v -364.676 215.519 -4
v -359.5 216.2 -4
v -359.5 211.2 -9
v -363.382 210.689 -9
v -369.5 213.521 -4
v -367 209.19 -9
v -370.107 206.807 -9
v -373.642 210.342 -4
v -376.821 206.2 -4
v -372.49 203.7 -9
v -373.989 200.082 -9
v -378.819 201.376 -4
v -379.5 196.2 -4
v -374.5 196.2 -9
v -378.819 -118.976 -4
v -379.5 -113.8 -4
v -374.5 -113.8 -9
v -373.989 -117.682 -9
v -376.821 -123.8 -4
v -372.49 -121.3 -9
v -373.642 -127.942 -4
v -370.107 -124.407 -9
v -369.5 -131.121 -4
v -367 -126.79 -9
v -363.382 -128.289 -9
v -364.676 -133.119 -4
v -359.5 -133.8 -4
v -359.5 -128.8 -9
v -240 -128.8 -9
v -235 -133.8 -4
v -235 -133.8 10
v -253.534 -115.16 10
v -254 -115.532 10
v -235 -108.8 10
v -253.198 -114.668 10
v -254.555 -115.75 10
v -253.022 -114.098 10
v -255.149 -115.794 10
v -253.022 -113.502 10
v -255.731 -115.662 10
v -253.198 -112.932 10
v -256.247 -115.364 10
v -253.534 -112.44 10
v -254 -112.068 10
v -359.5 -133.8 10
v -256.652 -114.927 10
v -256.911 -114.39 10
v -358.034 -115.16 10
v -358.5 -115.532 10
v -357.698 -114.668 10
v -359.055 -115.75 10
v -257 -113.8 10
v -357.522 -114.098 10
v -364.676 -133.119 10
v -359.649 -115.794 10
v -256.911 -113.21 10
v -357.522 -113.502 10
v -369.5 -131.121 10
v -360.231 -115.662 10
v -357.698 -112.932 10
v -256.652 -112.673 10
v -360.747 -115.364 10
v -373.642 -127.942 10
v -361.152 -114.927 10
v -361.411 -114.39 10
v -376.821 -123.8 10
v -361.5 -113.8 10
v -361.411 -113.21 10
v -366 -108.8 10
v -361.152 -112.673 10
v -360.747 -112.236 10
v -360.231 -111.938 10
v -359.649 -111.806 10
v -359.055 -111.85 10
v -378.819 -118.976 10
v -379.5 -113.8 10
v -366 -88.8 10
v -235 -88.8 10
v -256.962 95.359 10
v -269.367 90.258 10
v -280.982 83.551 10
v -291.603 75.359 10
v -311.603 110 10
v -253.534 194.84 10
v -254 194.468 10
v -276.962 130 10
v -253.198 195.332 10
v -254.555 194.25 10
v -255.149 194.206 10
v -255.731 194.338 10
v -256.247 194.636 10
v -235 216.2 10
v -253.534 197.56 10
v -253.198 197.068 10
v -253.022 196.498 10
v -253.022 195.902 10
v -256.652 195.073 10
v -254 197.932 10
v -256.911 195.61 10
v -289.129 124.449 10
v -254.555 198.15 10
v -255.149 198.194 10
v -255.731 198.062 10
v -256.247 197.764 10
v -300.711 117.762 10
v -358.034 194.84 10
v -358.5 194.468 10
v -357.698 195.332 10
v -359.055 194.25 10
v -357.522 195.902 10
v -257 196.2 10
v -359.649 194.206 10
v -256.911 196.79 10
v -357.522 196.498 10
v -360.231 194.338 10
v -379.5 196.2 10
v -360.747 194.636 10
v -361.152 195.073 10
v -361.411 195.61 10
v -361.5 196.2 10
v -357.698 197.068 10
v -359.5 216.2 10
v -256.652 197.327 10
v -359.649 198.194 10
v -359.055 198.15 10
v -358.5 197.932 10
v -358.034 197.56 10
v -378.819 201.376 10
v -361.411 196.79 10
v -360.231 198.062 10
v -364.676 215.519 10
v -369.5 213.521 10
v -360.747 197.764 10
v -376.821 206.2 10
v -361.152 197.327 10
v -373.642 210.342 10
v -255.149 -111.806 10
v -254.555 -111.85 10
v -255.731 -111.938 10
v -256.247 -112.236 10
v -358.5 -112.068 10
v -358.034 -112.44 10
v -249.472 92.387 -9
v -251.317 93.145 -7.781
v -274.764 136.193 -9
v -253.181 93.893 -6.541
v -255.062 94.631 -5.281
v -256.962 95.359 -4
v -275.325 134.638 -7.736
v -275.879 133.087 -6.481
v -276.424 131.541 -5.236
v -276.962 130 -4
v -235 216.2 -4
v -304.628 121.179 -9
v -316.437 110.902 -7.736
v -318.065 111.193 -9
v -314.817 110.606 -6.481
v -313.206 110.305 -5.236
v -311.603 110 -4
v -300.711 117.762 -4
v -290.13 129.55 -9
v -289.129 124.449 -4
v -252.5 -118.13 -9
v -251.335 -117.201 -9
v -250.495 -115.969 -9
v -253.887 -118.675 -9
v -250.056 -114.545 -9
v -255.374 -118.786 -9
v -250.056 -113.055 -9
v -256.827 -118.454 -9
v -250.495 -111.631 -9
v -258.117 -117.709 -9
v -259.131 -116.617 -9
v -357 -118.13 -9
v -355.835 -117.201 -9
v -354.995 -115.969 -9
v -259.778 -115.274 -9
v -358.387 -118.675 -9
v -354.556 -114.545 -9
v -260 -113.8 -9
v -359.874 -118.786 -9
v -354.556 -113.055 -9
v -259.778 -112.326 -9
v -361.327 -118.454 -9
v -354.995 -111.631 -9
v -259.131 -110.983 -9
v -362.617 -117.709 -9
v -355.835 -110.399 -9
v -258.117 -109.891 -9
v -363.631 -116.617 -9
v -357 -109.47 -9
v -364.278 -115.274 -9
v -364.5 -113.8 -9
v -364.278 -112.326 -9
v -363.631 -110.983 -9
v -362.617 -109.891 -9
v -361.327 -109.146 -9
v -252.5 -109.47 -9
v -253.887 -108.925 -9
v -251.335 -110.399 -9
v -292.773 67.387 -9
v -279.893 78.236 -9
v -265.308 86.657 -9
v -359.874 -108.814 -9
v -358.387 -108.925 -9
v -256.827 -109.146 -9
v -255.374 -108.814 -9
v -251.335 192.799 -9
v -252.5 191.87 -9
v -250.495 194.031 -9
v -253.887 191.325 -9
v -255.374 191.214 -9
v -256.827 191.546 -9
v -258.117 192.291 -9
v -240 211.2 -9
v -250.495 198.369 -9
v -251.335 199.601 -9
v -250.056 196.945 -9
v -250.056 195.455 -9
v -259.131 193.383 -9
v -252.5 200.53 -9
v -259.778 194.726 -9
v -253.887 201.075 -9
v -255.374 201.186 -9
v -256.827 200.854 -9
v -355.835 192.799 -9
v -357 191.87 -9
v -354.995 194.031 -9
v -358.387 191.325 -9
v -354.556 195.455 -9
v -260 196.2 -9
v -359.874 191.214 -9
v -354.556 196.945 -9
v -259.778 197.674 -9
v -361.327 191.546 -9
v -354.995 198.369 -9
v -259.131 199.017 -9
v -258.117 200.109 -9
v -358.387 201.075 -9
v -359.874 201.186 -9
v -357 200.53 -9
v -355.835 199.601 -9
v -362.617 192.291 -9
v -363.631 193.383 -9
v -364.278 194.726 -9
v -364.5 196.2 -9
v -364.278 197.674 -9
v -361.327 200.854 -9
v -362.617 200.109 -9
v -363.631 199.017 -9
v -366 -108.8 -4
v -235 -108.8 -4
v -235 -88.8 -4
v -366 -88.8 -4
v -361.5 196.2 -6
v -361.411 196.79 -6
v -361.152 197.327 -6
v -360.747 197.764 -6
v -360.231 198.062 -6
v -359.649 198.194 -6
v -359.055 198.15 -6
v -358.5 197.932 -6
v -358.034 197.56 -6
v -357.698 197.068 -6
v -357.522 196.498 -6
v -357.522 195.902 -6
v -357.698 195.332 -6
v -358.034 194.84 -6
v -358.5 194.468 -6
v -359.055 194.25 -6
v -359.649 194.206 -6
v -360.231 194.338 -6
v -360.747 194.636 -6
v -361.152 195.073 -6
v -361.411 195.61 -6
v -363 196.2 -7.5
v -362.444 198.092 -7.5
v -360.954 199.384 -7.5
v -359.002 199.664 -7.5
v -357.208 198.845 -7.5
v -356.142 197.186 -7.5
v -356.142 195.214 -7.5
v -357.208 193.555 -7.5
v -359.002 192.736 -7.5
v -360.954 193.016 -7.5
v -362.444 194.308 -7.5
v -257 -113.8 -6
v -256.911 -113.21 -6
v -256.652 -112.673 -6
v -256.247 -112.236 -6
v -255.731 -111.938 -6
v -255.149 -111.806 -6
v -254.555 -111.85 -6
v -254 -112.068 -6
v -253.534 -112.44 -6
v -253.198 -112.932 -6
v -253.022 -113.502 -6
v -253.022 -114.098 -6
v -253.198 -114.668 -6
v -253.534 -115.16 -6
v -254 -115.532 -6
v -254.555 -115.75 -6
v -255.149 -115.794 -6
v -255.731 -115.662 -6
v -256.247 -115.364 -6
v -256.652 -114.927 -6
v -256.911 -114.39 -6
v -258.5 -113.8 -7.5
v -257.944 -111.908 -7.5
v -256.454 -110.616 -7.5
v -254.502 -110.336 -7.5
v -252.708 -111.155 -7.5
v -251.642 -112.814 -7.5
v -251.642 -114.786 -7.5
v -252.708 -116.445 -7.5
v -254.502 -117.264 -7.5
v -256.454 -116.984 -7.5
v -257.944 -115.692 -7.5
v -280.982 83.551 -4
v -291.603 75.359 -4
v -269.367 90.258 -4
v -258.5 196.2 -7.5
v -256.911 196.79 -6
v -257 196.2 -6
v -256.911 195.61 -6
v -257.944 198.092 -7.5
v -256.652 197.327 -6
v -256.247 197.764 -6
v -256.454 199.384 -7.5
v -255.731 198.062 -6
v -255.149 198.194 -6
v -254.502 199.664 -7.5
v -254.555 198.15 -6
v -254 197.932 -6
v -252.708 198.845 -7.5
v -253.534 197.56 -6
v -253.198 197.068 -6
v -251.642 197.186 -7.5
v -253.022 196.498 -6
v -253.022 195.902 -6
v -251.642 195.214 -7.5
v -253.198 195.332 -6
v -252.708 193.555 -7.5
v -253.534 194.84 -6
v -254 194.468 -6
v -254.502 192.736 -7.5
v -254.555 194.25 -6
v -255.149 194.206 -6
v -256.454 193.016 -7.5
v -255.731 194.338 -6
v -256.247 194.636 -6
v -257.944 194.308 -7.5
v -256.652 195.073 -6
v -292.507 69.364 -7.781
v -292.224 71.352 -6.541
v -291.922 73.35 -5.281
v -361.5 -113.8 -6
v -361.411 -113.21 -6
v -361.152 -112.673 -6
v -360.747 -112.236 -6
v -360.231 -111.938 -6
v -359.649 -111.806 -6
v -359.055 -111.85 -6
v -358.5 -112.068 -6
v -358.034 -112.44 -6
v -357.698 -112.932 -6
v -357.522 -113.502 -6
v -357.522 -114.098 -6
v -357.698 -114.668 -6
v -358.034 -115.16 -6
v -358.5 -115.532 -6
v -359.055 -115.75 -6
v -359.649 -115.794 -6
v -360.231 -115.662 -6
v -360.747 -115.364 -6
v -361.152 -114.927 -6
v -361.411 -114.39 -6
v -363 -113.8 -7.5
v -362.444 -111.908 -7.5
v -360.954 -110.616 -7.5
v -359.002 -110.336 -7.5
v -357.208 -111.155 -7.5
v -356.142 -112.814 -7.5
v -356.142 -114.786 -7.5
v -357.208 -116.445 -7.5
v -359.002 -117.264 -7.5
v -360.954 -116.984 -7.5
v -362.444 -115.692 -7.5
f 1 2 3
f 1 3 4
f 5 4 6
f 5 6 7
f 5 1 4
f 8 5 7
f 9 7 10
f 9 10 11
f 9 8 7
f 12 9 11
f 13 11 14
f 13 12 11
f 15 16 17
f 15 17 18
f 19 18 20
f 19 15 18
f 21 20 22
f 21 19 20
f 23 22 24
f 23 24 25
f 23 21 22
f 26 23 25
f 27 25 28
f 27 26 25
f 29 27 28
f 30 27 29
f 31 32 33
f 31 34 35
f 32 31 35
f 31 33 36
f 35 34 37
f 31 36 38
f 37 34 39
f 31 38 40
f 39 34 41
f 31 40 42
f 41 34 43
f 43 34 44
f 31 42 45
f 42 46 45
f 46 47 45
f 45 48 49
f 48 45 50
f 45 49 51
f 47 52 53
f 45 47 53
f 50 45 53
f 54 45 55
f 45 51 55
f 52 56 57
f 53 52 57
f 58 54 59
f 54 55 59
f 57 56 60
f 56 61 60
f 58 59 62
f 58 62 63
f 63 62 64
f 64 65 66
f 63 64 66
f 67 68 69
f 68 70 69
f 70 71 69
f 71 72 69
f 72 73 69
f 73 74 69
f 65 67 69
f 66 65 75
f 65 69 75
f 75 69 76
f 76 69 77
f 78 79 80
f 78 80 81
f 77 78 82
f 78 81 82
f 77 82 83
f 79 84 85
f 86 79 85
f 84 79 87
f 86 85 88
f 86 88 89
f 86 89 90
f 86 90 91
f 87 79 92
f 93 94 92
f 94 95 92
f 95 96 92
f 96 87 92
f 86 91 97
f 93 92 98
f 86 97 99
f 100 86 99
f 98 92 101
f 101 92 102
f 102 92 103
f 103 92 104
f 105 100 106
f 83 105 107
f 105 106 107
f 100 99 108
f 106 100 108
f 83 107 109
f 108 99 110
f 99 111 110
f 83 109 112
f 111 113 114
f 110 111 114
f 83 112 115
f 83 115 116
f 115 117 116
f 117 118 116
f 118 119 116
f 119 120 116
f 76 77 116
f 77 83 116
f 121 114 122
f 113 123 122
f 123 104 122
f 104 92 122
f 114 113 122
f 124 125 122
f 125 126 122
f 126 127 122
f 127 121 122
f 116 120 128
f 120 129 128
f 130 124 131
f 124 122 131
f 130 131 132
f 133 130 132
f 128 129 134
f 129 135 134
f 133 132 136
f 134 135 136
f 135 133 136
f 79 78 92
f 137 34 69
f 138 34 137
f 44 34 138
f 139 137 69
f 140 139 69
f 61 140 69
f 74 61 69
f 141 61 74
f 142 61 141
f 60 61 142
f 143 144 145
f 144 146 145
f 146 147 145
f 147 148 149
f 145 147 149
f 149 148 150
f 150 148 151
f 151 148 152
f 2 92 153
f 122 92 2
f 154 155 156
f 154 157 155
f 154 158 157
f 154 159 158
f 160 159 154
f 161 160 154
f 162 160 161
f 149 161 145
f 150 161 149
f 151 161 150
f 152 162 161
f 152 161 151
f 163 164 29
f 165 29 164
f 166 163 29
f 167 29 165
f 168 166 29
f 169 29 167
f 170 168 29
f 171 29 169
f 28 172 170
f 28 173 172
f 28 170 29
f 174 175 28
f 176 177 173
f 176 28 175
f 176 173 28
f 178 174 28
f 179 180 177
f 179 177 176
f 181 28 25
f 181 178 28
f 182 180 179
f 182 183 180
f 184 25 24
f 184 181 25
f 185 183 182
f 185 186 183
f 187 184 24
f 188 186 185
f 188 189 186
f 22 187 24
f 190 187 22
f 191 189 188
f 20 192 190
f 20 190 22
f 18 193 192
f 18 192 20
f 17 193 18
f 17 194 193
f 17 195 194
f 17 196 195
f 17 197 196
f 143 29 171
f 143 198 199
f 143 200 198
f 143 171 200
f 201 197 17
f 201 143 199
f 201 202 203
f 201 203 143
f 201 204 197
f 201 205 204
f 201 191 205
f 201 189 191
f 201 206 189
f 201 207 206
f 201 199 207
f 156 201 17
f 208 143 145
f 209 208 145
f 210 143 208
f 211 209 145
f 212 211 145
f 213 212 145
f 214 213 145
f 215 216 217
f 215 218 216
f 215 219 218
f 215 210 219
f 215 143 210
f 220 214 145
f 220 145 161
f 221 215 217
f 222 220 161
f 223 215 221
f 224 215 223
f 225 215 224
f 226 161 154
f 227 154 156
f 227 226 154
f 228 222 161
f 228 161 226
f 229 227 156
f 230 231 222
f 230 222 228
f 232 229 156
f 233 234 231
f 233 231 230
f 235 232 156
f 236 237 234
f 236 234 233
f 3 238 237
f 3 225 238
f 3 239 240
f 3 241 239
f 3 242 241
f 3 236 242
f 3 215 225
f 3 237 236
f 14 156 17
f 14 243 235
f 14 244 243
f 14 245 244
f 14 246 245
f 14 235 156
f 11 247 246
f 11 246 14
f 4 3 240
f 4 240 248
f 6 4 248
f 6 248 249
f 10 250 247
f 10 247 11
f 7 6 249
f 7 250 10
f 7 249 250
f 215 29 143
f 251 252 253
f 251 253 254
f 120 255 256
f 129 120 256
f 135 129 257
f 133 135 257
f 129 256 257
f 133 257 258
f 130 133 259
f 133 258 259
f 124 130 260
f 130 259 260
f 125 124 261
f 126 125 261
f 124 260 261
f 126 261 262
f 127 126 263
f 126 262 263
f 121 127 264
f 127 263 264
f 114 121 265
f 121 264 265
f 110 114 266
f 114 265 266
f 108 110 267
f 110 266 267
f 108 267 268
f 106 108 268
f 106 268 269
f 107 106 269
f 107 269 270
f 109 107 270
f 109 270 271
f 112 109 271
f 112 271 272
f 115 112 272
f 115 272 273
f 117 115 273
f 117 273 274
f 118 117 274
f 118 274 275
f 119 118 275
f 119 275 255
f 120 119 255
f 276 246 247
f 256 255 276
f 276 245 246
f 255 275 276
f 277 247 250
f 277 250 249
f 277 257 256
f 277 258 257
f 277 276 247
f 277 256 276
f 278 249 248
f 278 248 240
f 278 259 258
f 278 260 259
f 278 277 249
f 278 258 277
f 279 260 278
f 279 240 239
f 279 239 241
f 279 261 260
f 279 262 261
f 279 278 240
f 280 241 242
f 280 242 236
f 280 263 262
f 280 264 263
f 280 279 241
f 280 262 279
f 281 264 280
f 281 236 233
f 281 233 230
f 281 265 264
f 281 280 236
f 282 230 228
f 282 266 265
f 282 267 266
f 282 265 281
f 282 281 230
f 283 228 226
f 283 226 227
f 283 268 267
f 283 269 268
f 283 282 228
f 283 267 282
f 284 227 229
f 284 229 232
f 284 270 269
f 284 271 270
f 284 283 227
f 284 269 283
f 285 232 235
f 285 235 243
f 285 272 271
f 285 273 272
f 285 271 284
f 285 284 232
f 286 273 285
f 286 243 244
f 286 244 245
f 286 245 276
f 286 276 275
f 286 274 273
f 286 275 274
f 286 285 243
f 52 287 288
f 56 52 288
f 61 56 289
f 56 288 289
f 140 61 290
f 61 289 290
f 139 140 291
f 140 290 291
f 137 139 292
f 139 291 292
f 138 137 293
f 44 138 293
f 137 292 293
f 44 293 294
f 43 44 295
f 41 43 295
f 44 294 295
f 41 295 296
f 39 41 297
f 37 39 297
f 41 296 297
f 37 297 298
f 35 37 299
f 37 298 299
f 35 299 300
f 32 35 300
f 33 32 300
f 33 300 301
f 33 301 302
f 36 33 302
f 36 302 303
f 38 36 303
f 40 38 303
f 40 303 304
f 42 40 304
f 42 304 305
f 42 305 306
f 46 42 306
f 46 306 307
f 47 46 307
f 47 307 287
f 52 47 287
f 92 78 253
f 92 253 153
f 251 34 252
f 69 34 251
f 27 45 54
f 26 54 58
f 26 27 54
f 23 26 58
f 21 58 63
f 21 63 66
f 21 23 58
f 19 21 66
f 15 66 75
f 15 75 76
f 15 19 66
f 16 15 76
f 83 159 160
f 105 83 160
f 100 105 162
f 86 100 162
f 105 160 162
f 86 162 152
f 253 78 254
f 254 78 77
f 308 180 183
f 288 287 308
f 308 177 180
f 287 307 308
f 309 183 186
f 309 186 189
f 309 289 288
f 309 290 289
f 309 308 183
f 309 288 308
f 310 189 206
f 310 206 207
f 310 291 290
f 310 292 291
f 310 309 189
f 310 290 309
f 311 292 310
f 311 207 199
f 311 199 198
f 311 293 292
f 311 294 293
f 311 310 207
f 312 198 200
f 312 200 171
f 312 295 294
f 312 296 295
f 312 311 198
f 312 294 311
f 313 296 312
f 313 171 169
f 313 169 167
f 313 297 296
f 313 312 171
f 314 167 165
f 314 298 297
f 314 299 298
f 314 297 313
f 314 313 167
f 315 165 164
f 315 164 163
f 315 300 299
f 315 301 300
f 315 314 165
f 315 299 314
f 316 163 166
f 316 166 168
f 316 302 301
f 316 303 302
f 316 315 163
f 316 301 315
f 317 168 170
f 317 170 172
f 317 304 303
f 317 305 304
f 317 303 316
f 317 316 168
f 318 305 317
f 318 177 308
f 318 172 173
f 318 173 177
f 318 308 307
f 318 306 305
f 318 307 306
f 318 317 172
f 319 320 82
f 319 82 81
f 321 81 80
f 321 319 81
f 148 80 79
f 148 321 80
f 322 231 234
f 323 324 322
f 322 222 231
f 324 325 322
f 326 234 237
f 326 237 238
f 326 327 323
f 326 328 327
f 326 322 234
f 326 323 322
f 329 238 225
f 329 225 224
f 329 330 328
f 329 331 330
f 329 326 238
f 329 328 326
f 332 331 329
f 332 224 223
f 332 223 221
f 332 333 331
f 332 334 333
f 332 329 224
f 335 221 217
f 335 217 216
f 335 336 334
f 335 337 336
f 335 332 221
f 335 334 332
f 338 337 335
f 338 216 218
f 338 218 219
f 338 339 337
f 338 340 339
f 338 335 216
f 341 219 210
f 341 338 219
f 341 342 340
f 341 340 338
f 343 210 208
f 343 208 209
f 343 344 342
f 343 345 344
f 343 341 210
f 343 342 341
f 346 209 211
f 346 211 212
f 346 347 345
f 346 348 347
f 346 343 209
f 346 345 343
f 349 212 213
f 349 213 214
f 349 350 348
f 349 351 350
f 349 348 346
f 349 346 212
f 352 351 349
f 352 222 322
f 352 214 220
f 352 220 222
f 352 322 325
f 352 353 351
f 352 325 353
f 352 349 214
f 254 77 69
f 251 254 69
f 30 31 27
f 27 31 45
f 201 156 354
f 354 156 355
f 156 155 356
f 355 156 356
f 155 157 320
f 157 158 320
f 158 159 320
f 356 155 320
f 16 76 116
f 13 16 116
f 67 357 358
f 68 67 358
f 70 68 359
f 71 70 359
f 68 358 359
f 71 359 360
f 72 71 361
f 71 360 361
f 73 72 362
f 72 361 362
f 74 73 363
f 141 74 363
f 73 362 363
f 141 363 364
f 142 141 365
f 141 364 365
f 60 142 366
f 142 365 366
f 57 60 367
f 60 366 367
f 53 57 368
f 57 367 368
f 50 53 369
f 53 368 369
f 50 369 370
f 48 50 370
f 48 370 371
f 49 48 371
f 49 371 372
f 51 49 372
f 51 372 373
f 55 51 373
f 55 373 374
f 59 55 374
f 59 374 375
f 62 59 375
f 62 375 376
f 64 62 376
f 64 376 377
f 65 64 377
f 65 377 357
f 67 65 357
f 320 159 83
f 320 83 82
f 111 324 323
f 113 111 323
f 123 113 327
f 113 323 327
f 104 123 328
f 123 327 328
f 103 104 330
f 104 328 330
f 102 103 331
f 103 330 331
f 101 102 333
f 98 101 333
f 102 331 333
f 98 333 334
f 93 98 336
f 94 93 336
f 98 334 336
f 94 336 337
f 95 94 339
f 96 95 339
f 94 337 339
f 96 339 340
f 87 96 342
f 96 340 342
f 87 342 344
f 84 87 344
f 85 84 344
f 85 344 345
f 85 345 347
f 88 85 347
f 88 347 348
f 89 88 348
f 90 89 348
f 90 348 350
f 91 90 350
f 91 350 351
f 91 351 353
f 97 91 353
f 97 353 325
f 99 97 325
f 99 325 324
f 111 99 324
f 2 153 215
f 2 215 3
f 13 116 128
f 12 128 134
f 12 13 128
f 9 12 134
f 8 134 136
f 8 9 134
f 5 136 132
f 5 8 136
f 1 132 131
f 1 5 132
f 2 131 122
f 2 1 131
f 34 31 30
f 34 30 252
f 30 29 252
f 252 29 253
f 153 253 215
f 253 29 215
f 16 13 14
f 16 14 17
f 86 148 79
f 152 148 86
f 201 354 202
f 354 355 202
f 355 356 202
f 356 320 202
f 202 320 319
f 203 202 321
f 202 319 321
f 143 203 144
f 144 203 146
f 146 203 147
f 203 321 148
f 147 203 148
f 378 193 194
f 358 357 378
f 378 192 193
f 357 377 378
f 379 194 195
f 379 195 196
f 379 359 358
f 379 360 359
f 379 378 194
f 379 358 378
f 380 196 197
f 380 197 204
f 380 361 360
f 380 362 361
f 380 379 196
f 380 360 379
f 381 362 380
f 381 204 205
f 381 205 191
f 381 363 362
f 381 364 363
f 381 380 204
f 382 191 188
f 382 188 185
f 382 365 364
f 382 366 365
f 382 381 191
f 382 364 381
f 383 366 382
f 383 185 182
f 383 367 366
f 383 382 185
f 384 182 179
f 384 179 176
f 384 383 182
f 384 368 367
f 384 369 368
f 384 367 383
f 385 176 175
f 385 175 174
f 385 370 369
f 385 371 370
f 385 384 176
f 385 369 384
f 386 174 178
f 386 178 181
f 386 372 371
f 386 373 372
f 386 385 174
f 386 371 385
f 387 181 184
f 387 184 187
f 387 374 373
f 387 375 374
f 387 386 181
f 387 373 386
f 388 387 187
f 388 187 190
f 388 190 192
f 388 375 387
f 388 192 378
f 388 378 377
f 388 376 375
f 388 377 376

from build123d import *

# Parameters (mm, degrees)
SKETCH024_W             = 144.5
SKETCH024_H             = 350
PAD017_DEPTH            = 19
FILLET007_R             = 20
SKETCH025_R             = 2
POCKET015_DEPTH         = 19.001
CHAMFER005_SIZE         = 5
POCKET020_DEPTH         = 19.001
CHAMFER006_SIZE         = 5
CHAMFER007_SIZE         = 3
SKETCH045_W             = 131
SKETCH045_H             = 20
POCKET029_DEPTH         = 14
BODY013_PLACEMENT_ANGLE = 180


with BuildPart() as part:
    # Sketch024 → Pad017 (new body)
    with BuildSketch(Plane.XY):
        with Locations((307.25, 41.2)):
            Rectangle(SKETCH024_W, SKETCH024_H)
    extrude(amount=PAD017_DEPTH)

    # Fillet007
    fillet007_edges = [part.edges().sort_by_distance(p)[0] for p in [
        (379.5, 216.2, 9.5),
        (379.5, -133.8, 9.5),
    ]]
    fillet(fillet007_edges, radius=FILLET007_R)

    # Sketch025 (on Face5 of Fillet007) → Pocket015 (cut, through all)
    with BuildSketch(Plane.XY.offset(19)):
        with Locations((359.5, 196.2)):
            Circle(SKETCH025_R)
        with Locations((359.5, -113.8)):
            Circle(SKETCH025_R)
        with Locations((255, -113.8)):
            Circle(SKETCH025_R)
        with Locations((255, 196.2)):
            Circle(SKETCH025_R)
    extrude(amount=-POCKET015_DEPTH, mode=Mode.SUBTRACT)

    # Chamfer005
    chamfer005_edges = [part.edges().sort_by_distance(p)[0] for p in [
        (297.25, 216.2, 19),
        (235, 41.2, 19),
    ]]
    chamfer(chamfer005_edges, length=CHAMFER005_SIZE)

    # Sketch030 (on Face9 of Chamfer005) → Pocket020 (cut, through all)
    with BuildSketch(Plane.XY.offset(19)):
        with BuildLine():
            Line((256.961524, 95.358984), (276.961524, 130))
            ThreePointArc((311.60254, 110), (295, 121.243557), (276.961524, 130))
            Line((311.60254, 110), (291.60254, 75.358984))
            ThreePointArc((291.60254, 75.358984), (275.286367, 87.098543), (256.961524, 95.358984))
        make_face()
    extrude(amount=-POCKET020_DEPTH, mode=Mode.SUBTRACT)

    # Chamfer006
    chamfer006_edges = [part.edges().sort_by_distance(p)[0] for p in [
        (295, 121.243557, 19),
        (266.961524, 112.679492, 19),
        (275.286367, 87.098543, 19),
        (301.60254, 92.679492, 19),
    ]]
    chamfer(chamfer006_edges, length=CHAMFER006_SIZE)

    # Chamfer007
    chamfer007_edges = [part.edges().sort_by_distance(p)[0] for p in [
        (253, 196.2, 19),
        (357.5, 196.2, 19),
        (357.5, -113.8, 19),
        (253, -113.8, 19),
    ]]
    chamfer(chamfer007_edges, length=CHAMFER007_SIZE)

    # Sketch045 (on Face30 of Chamfer007) → Pocket029 (cut)
    with BuildSketch(Plane(origin=(0, 0, 0), x_dir=(1, 0, 0), z_dir=(0, 0, -1))):
        with Locations((300.5, 98.8)):
            Rectangle(SKETCH045_W, SKETCH045_H)
    extrude(amount=-POCKET029_DEPTH, mode=Mode.SUBTRACT)


with BuildPart() as part_1:
    # Body013 placement: moved
    add(part.part.moved(Location((0, 0, 10))).rotate(Axis((0, 0, 10), (0, 1, 0)), BODY013_PLACEMENT_ANGLE))


solid = part_1.part
